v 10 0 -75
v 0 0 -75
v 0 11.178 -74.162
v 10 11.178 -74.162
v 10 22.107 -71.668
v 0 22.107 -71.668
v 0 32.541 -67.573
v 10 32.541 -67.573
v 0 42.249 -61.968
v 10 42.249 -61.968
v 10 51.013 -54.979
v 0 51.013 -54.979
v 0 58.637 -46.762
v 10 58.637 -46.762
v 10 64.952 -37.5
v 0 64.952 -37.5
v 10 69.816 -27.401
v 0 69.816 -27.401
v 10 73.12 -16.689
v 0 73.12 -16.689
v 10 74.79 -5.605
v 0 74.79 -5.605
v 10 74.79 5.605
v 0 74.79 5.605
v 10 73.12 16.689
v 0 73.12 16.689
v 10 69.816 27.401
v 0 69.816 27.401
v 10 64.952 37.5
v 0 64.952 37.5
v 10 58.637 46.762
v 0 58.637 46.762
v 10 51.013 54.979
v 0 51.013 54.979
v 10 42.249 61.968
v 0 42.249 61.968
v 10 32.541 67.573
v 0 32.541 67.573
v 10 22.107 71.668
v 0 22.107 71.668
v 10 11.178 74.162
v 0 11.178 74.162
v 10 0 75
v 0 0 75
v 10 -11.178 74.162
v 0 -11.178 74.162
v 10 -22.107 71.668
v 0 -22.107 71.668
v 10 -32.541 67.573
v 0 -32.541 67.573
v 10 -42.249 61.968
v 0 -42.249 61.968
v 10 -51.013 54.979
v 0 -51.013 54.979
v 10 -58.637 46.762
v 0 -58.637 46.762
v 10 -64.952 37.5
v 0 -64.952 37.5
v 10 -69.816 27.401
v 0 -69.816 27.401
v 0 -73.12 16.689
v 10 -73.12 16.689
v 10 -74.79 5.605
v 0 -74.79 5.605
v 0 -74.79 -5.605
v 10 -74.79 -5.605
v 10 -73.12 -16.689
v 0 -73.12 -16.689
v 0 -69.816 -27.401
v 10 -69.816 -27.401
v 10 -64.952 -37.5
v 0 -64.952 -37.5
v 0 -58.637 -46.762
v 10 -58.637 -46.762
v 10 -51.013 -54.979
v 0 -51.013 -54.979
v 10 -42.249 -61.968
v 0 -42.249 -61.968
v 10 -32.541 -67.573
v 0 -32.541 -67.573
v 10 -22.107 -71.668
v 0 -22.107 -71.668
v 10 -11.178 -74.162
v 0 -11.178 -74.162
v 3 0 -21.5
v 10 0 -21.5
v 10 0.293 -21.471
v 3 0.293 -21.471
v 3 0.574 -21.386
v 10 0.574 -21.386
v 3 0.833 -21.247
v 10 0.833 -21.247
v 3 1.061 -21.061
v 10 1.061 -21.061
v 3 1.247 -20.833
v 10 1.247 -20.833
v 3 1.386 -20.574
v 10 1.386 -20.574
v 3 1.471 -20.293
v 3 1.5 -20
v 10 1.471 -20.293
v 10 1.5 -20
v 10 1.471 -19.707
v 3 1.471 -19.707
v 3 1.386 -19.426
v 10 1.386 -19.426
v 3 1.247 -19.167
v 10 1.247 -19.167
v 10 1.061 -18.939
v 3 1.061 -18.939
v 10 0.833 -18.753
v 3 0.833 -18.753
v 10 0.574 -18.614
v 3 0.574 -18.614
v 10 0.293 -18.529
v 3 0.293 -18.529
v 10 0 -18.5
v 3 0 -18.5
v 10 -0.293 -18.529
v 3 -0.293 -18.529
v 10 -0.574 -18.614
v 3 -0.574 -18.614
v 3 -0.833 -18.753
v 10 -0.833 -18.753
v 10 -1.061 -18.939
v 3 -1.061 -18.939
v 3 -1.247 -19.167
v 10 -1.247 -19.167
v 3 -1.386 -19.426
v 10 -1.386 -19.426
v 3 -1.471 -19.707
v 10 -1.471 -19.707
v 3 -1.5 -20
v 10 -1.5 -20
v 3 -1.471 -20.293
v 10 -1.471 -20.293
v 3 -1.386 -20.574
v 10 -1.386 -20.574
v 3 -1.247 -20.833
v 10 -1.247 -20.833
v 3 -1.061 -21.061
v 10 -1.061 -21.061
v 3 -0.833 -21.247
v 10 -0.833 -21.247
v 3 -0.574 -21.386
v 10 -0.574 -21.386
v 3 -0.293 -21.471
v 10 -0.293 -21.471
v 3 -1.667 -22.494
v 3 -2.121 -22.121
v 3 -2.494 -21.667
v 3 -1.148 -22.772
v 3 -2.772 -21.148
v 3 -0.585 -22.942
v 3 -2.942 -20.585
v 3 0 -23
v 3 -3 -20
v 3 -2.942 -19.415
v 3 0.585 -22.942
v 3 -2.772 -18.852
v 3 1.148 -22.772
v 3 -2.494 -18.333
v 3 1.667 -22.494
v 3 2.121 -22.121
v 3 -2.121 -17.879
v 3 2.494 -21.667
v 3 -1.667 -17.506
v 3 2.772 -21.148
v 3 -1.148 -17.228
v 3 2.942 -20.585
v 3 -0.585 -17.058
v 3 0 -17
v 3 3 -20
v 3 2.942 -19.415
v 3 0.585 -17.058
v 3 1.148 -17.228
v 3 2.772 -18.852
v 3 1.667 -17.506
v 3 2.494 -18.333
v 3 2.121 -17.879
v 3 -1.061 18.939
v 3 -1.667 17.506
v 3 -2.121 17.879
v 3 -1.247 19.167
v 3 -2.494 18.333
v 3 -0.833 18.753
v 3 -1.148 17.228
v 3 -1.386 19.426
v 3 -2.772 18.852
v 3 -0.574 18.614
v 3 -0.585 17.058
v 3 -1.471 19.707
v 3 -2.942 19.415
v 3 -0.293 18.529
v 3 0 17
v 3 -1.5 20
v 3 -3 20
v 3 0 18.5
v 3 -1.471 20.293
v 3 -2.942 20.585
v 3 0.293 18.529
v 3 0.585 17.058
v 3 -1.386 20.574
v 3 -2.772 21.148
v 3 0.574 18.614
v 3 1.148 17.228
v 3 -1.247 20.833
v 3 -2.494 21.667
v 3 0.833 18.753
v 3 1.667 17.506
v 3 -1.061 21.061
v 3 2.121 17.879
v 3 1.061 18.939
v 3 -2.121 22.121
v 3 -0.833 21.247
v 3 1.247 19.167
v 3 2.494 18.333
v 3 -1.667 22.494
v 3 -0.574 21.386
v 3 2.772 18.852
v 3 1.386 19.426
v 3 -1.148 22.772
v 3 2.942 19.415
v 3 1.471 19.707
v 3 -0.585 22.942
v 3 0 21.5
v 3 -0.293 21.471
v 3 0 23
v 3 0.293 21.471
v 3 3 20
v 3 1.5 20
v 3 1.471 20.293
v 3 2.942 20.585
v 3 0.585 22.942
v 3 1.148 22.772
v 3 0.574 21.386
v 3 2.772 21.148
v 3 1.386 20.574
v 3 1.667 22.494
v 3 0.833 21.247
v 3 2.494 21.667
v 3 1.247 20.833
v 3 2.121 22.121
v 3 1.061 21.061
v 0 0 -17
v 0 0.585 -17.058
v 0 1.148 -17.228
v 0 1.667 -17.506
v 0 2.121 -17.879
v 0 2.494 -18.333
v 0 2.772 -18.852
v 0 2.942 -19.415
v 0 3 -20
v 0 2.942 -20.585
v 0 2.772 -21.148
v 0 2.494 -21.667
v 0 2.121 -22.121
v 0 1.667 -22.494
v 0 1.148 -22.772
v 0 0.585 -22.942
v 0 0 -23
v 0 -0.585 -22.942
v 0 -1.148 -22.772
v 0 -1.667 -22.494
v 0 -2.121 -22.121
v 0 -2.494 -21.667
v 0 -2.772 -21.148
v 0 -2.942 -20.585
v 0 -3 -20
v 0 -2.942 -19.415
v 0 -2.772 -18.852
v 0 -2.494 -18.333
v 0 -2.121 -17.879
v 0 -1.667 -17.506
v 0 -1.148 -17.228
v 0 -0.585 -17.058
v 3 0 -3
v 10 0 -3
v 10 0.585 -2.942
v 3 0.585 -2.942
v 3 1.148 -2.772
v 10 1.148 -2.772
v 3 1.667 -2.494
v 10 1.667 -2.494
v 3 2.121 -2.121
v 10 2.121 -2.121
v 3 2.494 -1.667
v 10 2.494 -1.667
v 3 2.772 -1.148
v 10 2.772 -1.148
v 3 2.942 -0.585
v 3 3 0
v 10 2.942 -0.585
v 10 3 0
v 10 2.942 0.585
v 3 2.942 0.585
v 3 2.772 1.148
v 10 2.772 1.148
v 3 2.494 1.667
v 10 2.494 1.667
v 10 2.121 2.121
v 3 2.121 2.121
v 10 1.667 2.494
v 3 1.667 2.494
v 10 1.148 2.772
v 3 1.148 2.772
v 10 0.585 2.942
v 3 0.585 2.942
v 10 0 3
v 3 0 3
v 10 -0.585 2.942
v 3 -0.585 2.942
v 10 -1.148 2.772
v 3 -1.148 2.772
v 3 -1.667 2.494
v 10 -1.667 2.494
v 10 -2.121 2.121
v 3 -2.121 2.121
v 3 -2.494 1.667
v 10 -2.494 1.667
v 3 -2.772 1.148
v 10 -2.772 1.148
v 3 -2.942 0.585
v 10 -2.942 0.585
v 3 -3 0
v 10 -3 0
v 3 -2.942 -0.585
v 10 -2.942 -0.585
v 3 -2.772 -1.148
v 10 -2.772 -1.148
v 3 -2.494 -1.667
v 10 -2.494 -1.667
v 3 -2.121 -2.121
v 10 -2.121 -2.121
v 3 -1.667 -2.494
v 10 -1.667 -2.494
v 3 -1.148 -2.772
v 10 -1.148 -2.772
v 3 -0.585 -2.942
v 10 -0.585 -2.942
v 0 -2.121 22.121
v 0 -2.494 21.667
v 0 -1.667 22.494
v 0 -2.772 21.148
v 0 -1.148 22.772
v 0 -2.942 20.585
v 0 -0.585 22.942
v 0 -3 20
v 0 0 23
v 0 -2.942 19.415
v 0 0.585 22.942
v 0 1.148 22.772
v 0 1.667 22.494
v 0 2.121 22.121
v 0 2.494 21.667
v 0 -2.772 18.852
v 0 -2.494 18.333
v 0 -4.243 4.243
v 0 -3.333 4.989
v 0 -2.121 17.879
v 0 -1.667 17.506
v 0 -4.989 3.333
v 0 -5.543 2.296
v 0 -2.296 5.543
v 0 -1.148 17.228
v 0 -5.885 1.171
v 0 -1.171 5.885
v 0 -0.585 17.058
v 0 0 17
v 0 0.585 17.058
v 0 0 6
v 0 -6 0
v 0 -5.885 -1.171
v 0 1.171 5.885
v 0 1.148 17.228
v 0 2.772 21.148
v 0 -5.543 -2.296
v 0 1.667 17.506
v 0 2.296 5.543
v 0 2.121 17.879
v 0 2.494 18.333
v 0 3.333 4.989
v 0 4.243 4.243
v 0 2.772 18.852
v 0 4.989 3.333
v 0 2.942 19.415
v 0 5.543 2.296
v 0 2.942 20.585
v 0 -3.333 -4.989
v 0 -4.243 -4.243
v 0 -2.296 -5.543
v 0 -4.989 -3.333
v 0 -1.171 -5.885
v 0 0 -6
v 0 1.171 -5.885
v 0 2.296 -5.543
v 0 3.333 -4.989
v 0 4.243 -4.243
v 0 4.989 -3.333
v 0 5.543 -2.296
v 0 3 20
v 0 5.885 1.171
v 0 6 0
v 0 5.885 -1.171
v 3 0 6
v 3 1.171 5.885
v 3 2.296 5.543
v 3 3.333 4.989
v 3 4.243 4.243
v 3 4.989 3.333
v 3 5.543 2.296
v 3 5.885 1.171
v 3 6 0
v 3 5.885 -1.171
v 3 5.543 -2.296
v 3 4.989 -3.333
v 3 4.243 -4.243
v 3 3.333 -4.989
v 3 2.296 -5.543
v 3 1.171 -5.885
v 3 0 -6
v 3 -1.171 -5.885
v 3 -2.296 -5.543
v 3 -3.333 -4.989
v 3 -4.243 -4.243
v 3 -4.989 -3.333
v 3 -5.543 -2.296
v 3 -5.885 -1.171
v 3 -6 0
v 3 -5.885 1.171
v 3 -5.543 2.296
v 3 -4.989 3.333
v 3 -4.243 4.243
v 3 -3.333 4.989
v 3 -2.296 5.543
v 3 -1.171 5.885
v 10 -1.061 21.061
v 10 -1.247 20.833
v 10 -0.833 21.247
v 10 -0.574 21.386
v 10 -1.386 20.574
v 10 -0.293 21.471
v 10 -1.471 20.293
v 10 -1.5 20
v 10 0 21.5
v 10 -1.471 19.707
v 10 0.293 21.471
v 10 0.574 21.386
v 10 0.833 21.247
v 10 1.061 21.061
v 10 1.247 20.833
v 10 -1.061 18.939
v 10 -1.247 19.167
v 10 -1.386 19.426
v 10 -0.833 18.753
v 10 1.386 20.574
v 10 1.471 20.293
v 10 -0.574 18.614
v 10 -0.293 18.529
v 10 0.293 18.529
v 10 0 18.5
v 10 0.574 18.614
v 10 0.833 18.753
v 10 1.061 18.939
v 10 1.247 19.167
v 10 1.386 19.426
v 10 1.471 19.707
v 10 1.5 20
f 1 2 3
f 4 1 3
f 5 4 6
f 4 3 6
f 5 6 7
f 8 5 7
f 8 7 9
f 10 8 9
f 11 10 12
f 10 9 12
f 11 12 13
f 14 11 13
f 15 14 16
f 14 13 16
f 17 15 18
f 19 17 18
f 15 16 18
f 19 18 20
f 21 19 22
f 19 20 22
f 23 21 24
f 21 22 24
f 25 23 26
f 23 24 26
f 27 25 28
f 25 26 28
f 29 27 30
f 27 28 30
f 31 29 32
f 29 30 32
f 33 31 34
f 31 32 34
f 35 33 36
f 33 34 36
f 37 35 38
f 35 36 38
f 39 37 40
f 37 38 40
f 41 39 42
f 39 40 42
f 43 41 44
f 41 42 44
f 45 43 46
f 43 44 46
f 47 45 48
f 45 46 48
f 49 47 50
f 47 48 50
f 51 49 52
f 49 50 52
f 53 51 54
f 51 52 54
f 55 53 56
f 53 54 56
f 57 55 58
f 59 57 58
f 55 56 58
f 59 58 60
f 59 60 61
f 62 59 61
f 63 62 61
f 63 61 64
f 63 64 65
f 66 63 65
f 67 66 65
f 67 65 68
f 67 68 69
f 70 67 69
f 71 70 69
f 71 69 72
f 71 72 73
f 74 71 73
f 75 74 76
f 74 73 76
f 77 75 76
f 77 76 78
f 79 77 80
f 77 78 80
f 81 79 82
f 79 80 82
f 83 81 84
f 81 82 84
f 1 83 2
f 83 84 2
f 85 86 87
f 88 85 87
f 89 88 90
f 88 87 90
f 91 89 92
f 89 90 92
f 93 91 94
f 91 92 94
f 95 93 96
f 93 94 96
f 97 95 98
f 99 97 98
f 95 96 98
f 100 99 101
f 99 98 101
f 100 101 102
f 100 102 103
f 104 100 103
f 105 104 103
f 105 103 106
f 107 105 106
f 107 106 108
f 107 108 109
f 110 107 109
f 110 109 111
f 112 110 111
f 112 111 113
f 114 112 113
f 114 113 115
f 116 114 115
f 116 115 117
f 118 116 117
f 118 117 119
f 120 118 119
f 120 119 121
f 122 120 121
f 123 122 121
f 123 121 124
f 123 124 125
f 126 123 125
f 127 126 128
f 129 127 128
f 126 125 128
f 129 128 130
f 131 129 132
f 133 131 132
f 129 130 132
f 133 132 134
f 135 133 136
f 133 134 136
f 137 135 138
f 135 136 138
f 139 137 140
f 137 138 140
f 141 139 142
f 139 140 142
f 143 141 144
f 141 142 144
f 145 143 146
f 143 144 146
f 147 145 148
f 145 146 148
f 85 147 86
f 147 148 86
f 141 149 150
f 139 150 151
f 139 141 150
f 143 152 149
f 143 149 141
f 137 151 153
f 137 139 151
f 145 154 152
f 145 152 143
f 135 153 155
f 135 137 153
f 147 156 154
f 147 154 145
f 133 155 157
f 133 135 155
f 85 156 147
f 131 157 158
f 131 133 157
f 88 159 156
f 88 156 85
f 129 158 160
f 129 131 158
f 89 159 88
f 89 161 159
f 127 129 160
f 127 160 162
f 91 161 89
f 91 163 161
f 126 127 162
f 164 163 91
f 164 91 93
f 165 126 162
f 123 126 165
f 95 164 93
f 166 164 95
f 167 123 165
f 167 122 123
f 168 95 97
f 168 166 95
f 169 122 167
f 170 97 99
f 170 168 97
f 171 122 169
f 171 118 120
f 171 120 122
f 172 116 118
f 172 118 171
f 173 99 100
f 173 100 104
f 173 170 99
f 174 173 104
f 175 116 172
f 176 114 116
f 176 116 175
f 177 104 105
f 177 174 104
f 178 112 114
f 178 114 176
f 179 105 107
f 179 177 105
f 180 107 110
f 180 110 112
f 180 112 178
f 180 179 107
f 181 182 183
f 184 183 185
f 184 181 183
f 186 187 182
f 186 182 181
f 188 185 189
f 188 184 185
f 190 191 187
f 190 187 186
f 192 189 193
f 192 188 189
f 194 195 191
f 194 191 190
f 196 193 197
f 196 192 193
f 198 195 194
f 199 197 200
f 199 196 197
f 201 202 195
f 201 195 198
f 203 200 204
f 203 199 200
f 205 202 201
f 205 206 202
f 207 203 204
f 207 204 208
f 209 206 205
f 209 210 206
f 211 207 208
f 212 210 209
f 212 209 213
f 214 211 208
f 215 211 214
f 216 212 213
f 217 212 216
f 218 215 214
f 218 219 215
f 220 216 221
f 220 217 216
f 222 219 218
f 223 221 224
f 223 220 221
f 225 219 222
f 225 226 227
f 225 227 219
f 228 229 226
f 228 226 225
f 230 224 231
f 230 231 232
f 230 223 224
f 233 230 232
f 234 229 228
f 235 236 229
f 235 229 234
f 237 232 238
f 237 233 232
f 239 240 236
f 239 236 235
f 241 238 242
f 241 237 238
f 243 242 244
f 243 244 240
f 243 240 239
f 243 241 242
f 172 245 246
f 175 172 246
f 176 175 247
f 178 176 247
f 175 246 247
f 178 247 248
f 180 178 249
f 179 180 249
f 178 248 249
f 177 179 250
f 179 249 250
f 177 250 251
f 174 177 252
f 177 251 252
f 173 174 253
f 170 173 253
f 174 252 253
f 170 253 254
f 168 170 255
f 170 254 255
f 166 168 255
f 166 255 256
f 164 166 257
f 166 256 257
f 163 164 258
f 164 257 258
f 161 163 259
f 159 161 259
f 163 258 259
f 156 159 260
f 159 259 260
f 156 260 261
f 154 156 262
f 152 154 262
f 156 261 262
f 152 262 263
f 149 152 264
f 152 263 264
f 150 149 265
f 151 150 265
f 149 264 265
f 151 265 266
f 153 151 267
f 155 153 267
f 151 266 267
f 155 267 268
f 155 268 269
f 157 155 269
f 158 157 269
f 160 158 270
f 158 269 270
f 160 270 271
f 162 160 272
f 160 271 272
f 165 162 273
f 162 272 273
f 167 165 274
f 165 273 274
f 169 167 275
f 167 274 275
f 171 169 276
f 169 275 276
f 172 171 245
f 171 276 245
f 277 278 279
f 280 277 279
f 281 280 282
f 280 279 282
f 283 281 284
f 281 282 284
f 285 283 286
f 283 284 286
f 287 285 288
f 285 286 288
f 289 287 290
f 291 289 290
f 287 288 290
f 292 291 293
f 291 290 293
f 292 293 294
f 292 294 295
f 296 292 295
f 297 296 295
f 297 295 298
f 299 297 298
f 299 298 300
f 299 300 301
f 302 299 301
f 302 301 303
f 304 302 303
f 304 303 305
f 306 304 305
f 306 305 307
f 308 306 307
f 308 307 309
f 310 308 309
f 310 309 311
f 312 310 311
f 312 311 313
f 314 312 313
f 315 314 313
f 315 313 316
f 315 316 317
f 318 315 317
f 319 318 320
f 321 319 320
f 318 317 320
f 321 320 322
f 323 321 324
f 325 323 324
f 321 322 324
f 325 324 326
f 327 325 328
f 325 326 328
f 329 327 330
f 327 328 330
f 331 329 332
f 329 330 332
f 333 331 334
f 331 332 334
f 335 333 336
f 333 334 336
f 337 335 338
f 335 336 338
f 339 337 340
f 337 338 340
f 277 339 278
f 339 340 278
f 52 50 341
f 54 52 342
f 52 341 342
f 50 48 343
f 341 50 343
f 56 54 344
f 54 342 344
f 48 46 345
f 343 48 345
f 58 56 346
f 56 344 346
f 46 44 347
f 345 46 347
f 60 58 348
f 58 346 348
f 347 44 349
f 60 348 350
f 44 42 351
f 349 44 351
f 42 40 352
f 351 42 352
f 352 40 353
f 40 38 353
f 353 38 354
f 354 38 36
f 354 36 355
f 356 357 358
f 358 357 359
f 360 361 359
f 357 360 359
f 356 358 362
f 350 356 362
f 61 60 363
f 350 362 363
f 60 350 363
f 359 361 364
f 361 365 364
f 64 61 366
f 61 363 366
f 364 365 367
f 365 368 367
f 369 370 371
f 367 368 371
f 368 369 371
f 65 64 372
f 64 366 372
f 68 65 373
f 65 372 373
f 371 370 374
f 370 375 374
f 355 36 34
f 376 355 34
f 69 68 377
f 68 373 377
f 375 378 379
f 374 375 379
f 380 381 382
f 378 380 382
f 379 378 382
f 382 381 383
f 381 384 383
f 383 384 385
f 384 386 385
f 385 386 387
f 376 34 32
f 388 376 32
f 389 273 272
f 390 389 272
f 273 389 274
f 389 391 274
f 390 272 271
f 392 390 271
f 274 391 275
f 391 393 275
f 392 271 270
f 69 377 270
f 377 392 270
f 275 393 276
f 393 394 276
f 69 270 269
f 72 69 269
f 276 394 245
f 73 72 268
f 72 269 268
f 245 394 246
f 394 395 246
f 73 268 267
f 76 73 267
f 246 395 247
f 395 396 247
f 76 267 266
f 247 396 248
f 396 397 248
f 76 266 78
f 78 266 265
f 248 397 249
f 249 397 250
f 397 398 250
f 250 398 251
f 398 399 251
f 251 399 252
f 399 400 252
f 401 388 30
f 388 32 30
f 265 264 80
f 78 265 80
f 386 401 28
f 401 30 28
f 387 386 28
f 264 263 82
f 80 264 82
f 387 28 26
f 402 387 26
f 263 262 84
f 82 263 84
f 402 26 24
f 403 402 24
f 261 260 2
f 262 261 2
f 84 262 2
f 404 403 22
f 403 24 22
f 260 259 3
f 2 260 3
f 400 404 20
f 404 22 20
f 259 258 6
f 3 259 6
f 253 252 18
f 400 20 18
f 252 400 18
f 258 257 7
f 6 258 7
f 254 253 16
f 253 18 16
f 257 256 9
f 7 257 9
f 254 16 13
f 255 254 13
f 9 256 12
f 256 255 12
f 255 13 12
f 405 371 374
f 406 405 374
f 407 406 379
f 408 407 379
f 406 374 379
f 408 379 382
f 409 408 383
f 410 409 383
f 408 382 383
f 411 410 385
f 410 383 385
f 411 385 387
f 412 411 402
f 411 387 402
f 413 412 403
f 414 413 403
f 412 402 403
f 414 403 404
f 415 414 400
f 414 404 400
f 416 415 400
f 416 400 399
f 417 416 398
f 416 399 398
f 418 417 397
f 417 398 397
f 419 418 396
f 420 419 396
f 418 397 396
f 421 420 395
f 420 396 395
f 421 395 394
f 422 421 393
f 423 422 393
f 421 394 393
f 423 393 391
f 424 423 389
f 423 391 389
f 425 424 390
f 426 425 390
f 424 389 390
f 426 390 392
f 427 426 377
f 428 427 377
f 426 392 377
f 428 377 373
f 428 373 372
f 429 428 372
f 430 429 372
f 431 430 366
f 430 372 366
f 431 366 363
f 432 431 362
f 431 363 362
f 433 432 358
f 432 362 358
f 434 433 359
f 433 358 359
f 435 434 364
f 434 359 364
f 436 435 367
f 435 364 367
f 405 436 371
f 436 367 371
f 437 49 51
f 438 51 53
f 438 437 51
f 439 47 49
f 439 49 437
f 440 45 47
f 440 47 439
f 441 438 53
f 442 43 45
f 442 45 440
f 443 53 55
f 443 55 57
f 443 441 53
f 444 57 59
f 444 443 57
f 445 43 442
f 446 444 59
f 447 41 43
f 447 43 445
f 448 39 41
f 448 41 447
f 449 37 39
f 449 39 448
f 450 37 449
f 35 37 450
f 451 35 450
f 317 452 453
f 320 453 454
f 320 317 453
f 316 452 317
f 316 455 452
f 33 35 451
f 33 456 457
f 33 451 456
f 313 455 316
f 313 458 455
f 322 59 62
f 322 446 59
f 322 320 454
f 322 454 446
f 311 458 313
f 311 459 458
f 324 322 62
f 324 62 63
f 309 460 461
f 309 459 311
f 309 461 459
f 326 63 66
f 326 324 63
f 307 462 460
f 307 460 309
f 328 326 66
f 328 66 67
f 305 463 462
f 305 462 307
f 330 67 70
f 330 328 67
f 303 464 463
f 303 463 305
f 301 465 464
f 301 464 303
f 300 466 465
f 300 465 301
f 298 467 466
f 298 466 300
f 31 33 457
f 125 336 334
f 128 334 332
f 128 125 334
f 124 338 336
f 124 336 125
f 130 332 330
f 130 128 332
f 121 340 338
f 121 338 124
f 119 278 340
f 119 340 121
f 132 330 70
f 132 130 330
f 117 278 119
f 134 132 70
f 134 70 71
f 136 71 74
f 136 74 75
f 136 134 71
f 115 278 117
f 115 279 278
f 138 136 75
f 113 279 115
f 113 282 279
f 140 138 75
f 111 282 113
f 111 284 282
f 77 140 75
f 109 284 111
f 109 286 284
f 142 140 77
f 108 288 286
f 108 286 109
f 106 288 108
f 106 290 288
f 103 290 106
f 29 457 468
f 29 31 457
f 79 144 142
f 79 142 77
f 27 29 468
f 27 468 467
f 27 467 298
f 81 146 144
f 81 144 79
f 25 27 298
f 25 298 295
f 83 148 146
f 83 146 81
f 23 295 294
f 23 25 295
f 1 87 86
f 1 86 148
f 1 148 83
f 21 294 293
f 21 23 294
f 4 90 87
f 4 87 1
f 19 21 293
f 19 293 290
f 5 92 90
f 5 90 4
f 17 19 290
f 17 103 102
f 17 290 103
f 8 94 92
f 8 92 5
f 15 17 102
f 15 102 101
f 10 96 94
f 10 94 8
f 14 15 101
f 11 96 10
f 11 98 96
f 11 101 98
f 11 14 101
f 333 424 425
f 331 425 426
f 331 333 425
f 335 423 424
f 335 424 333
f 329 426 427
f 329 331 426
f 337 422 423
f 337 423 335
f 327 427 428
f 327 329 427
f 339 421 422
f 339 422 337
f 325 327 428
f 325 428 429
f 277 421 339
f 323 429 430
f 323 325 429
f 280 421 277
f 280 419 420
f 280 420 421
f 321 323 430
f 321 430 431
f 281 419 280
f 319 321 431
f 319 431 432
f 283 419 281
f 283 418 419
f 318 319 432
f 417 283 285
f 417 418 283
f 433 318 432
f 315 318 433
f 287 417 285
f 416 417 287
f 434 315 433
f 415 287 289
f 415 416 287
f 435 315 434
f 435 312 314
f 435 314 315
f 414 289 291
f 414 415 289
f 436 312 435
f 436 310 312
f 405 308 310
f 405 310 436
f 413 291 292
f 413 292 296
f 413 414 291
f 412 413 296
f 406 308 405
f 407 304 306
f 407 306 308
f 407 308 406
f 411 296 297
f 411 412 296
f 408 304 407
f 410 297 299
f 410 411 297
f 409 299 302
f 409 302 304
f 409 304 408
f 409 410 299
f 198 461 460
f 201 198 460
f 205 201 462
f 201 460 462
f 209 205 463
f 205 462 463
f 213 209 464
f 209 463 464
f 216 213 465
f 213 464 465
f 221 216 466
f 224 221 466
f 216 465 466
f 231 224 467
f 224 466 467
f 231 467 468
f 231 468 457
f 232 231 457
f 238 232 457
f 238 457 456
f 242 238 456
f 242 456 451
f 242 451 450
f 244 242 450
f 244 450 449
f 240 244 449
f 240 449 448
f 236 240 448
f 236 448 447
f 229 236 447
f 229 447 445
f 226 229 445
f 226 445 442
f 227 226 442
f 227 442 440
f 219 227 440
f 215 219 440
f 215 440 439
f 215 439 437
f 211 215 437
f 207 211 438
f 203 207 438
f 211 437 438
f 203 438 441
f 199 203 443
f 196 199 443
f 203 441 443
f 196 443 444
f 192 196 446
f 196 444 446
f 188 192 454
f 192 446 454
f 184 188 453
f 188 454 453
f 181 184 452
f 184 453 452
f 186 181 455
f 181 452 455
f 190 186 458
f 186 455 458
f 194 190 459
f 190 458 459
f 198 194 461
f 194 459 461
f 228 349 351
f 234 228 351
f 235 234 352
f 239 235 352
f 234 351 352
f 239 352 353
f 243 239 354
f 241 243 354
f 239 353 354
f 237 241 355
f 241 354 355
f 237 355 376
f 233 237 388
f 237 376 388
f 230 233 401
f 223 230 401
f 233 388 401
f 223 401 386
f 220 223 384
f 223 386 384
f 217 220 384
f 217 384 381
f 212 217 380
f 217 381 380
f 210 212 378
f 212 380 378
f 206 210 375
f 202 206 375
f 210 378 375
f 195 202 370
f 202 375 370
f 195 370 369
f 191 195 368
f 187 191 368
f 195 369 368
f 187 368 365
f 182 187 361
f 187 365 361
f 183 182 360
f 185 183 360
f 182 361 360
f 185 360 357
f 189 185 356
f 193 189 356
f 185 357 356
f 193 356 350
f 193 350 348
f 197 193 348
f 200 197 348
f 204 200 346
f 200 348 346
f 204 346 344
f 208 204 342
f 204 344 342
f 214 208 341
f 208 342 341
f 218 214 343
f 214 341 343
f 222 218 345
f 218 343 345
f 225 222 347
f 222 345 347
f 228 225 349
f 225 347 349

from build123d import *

# Parameters (mm, degrees)
SKETCH_1_R          = 75
EXTRUDE_1_DEPTH     = 10
SKETCH_2_R          = 3
SKETCH_2_R_2        = 1.5
CUT_EXTRUDE_1_DEPTH = 10
SKETCH_3_R          = 6
CUT_EXTRUDE_2_DEPTH = 3
SKETCH_4_R          = 3
CUT_EXTRUDE_3_DEPTH = 3
SKETCH_5_R          = 3
CUT_EXTRUDE_4_DEPTH = 3


with BuildPart() as part:
    # 草图1 → 凸台-拉伸1 (new body)
    with BuildSketch(Plane(origin=(0, 0, 0), x_dir=(0, 0, -1), z_dir=(1, 0, 0))):
        Circle(SKETCH_1_R)
    extrude(amount=EXTRUDE_1_DEPTH)

    # 草图2 → 切除-拉伸1 (cut)
    with BuildSketch(Plane(origin=(10, 0, 0), x_dir=(0, 0, -1), z_dir=(1, 0, 0))):
        Circle(SKETCH_2_R)
        with Locations((-20, 0)):
            Circle(SKETCH_2_R_2)
        with Locations((20, 0)):
            Circle(SKETCH_2_R_2)
    extrude(amount=-CUT_EXTRUDE_1_DEPTH, mode=Mode.SUBTRACT)

    # 草图3 → 切除-拉伸2 (cut)
    with BuildSketch(Plane.ZY):
        Circle(SKETCH_3_R)
    extrude(amount=-CUT_EXTRUDE_2_DEPTH, mode=Mode.SUBTRACT)

    # 草图4 → 切除-拉伸3 (cut)
    with BuildSketch(Plane.ZY):
        with Locations((20, 0)):
            Circle(SKETCH_4_R)
    extrude(amount=-CUT_EXTRUDE_3_DEPTH, mode=Mode.SUBTRACT)

    # 草图5 → 切除-拉伸4 (cut)
    with BuildSketch(Plane.ZY):
        with Locations((-20, 0)):
            Circle(SKETCH_5_R)
    extrude(amount=-CUT_EXTRUDE_4_DEPTH, mode=Mode.SUBTRACT)


solid = part.part
